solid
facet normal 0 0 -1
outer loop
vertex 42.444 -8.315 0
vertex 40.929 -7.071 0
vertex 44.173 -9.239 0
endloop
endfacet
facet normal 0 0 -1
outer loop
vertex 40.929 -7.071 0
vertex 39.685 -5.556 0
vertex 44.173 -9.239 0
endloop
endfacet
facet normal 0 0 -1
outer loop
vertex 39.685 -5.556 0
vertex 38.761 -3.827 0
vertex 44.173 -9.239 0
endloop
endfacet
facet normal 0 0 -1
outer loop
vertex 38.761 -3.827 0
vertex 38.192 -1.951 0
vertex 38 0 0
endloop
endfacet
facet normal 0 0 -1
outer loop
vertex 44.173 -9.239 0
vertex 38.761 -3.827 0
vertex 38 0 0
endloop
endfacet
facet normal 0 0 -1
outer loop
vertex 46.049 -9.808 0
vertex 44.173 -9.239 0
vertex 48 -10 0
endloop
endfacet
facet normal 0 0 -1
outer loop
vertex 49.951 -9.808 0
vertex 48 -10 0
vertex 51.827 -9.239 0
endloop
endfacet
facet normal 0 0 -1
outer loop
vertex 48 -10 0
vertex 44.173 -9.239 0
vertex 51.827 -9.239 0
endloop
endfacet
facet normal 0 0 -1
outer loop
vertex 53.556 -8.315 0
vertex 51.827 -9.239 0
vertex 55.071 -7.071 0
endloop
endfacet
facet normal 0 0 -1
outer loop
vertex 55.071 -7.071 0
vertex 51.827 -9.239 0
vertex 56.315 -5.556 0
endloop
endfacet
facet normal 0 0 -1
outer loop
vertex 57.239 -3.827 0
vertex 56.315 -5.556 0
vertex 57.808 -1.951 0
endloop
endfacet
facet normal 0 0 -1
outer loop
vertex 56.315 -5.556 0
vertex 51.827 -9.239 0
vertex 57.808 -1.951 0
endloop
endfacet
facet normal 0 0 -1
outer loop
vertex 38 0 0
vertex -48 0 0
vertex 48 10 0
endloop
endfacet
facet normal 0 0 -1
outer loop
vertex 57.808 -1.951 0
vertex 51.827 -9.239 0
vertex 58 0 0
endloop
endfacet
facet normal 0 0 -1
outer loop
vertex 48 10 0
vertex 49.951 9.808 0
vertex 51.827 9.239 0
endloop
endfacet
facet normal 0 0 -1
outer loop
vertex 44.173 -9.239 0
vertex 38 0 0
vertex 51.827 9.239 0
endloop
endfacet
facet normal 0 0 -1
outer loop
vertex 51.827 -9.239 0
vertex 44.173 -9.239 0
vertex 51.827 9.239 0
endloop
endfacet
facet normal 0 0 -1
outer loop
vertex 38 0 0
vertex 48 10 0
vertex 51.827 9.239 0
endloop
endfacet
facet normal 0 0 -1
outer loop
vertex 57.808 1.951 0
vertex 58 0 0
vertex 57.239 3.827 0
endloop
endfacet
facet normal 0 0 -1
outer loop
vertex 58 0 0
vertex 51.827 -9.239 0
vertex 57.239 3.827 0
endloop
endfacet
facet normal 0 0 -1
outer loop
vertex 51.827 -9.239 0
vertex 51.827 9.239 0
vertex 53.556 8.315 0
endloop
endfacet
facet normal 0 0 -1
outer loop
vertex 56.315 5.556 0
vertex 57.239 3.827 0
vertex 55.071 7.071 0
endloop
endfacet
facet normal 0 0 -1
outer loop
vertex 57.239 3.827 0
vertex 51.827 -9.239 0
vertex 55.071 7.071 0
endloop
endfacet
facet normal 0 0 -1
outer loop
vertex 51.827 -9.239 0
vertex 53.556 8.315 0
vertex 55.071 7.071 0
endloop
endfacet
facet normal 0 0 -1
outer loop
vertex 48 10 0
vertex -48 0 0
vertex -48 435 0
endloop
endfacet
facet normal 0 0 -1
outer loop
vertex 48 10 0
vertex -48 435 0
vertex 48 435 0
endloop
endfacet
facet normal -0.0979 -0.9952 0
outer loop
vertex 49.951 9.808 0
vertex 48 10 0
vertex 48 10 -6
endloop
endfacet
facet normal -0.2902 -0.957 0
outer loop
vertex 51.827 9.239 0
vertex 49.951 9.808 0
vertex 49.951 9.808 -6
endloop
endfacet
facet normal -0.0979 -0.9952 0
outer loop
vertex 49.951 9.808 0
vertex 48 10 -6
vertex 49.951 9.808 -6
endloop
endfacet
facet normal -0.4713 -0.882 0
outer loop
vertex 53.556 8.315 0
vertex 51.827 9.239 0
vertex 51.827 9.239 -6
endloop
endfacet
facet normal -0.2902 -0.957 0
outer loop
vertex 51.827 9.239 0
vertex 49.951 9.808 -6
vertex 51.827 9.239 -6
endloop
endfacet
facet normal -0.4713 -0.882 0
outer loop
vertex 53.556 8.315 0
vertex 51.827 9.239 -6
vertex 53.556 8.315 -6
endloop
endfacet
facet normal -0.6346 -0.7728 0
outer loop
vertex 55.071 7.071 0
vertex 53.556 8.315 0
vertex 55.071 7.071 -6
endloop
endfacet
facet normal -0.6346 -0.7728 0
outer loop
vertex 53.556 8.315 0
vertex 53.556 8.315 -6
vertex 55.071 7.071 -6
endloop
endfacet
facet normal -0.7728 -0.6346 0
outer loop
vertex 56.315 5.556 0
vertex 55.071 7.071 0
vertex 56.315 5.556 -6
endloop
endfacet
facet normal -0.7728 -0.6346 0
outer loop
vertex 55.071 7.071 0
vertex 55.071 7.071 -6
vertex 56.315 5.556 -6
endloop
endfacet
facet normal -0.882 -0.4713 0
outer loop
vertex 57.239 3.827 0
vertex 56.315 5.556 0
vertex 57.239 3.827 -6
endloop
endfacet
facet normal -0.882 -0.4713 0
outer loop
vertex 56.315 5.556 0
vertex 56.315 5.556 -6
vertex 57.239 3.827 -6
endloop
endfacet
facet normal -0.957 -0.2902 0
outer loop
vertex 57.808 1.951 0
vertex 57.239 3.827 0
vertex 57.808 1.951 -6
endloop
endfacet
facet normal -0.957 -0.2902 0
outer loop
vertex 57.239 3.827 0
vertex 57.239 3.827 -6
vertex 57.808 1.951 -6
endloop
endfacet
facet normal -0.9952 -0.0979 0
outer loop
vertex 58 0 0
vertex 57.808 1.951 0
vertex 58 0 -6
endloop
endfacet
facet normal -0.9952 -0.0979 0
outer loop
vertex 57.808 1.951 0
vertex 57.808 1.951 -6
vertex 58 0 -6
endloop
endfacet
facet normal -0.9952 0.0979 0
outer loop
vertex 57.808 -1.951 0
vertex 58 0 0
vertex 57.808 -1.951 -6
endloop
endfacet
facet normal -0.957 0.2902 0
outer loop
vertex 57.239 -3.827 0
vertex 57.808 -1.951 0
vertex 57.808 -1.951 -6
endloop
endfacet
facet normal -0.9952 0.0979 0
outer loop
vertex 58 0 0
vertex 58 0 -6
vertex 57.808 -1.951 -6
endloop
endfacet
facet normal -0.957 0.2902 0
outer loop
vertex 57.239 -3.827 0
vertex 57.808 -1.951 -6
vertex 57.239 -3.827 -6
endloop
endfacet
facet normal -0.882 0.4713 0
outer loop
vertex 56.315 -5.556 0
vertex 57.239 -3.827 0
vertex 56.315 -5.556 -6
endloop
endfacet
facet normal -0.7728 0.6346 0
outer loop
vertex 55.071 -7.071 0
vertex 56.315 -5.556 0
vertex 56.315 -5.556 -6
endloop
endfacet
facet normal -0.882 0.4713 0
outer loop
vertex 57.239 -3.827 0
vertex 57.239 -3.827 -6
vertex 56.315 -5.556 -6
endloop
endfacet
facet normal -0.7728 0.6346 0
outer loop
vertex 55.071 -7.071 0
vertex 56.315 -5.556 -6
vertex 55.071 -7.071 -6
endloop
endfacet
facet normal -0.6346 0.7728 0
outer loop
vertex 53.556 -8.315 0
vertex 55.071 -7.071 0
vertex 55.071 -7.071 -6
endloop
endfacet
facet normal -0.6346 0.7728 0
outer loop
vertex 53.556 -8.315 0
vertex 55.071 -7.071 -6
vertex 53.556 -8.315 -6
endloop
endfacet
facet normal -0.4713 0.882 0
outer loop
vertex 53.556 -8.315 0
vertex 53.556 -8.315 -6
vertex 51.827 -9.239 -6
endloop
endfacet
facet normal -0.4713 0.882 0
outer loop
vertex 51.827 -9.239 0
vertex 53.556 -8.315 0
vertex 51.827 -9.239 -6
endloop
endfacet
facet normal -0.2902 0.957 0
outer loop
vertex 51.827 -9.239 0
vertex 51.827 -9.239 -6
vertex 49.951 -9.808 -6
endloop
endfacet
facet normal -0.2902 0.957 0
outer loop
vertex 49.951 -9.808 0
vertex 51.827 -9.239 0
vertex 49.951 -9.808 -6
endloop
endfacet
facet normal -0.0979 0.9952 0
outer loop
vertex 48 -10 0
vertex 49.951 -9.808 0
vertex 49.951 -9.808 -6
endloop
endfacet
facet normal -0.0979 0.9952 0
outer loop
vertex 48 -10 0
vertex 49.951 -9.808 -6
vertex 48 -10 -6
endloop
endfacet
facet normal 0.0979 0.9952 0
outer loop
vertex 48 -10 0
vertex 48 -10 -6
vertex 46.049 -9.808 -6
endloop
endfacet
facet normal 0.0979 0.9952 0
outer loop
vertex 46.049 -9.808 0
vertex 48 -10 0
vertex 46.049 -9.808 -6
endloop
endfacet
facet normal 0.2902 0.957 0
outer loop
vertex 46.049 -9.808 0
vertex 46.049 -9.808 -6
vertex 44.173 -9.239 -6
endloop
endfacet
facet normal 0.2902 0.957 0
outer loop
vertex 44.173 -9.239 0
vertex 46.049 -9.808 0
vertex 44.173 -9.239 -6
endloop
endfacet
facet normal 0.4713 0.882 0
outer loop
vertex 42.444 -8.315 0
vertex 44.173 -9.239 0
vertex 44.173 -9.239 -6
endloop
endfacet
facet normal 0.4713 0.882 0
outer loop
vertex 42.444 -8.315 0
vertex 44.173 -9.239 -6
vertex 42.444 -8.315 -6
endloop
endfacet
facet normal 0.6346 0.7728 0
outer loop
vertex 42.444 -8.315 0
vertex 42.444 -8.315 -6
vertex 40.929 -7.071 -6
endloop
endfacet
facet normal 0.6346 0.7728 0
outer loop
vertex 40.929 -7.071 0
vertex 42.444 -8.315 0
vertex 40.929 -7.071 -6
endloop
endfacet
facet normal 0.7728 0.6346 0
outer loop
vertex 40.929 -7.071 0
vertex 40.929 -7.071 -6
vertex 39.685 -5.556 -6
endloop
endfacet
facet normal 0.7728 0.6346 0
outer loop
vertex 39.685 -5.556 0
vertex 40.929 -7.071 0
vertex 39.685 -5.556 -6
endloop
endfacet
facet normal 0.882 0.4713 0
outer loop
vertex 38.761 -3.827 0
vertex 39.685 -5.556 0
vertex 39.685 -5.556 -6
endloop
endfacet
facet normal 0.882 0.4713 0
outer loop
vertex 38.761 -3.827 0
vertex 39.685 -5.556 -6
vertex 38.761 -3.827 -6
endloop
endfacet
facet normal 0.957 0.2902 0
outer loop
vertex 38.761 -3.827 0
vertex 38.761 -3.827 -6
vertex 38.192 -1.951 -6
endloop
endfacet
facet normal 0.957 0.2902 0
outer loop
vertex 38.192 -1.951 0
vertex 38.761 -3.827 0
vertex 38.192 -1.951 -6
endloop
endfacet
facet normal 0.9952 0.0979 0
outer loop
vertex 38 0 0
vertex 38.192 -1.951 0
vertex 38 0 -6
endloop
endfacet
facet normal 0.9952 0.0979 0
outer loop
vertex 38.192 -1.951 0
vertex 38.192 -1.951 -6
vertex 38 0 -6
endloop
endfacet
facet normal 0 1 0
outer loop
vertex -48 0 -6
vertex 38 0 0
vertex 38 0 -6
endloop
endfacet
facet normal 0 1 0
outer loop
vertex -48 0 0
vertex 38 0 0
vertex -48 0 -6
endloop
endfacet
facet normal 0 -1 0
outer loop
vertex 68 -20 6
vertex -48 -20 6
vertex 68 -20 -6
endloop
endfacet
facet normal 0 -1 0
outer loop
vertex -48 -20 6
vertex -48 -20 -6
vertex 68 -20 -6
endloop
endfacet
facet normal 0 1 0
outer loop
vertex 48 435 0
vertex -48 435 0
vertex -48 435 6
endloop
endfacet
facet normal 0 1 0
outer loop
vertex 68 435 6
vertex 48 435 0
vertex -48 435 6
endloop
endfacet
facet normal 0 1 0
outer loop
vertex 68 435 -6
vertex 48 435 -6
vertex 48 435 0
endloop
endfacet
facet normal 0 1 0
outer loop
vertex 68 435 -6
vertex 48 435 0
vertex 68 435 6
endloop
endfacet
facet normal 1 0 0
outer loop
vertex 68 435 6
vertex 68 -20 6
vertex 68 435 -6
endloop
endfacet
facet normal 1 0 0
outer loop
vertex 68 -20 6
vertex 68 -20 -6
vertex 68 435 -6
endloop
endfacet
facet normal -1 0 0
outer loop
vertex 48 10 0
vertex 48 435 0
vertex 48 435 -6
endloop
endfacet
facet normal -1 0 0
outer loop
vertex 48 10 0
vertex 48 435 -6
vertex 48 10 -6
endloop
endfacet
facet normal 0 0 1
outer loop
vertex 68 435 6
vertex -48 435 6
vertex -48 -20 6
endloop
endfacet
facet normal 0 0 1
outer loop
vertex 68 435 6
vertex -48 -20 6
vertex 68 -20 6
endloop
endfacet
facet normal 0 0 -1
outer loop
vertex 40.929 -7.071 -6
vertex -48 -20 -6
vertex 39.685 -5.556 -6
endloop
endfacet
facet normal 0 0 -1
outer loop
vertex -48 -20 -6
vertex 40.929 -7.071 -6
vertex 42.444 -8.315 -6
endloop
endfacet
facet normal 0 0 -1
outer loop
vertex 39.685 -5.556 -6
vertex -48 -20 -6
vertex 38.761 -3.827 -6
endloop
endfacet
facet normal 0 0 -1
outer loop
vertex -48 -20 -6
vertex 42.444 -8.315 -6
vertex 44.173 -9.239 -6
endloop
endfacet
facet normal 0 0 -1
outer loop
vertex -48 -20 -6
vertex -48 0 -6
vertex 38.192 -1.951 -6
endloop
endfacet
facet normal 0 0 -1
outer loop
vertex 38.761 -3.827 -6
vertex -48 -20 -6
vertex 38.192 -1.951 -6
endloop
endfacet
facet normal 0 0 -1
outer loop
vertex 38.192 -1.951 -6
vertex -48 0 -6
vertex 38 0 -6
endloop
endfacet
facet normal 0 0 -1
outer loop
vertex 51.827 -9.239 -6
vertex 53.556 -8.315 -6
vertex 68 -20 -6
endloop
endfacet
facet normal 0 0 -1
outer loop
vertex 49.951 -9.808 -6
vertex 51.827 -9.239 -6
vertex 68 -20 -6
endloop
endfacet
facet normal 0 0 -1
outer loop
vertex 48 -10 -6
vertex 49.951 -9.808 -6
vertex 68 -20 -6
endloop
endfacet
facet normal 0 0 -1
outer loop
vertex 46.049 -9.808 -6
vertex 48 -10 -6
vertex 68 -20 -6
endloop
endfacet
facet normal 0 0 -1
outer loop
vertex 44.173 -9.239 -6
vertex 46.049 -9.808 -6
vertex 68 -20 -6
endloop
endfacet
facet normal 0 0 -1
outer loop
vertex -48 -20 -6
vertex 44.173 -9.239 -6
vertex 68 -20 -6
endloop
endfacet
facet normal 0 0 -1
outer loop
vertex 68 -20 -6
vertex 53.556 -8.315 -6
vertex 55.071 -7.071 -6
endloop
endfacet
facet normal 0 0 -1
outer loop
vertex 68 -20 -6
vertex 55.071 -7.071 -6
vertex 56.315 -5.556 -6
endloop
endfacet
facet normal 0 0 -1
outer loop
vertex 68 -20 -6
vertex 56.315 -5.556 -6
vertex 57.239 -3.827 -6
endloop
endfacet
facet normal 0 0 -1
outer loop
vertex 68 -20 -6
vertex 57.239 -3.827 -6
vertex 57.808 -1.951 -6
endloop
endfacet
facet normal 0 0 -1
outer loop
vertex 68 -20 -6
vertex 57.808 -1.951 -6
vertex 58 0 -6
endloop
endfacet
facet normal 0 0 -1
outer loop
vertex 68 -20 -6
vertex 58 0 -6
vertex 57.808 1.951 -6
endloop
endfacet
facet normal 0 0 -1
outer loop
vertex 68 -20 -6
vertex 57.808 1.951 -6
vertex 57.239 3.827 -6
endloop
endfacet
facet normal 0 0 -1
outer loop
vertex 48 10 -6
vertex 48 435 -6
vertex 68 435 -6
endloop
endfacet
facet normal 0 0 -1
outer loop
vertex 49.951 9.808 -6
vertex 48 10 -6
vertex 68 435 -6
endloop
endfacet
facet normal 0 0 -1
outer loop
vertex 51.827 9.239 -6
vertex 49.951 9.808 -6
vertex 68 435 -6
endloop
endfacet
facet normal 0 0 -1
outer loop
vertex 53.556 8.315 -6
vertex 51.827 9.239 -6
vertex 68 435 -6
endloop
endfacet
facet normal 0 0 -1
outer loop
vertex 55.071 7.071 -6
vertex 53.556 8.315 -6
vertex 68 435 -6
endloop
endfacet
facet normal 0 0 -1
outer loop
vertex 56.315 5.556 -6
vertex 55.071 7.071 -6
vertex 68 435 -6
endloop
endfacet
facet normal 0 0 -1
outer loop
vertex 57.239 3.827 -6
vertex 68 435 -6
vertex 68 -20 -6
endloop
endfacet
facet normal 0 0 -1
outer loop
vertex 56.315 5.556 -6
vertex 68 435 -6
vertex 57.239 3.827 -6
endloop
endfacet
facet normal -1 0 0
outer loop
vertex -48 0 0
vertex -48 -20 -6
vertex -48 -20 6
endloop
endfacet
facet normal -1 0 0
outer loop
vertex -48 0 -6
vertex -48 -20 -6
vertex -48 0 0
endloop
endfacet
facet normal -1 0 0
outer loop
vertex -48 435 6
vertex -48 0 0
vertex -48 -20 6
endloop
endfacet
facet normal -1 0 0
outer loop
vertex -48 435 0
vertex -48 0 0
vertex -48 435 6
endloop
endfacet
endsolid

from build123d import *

# Parameters (mm, degrees)
BOSS_EXTRUDE1_DEPTH = 6
SKETCH2_W           = 116
SKETCH2_H           = 455
BOSS_EXTRUDE2_DEPTH = 6
SKETCH3_R           = 10
CUT_EXTRUDE1_DEPTH  = 6


with BuildPart() as part:
    # Sketch1 → Boss-Extrude1 (new body)
    with BuildSketch(Plane.XY):
        Polygon((68, 435), (48, 435), (48, 0), (-48, 0), (-48, -20), (68, -20), align=None)
    extrude(amount=-BOSS_EXTRUDE1_DEPTH)

    # Sketch2 → Boss-Extrude2 (add)
    with BuildSketch(Plane.XY):
        with Locations((10, 207.5)):
            Rectangle(SKETCH2_W, SKETCH2_H)
    extrude(amount=BOSS_EXTRUDE2_DEPTH)

    # Sketch3 → Cut-Extrude1 (cut)
    with BuildSketch(Plane(origin=(0, 0, -6), x_dir=(-1, 0, 0), z_dir=(0, 0, -1))):
        with Locations((-48, 0)):
            Circle(SKETCH3_R)
    extrude(amount=-CUT_EXTRUDE1_DEPTH, mode=Mode.SUBTRACT)


solid = part.part
